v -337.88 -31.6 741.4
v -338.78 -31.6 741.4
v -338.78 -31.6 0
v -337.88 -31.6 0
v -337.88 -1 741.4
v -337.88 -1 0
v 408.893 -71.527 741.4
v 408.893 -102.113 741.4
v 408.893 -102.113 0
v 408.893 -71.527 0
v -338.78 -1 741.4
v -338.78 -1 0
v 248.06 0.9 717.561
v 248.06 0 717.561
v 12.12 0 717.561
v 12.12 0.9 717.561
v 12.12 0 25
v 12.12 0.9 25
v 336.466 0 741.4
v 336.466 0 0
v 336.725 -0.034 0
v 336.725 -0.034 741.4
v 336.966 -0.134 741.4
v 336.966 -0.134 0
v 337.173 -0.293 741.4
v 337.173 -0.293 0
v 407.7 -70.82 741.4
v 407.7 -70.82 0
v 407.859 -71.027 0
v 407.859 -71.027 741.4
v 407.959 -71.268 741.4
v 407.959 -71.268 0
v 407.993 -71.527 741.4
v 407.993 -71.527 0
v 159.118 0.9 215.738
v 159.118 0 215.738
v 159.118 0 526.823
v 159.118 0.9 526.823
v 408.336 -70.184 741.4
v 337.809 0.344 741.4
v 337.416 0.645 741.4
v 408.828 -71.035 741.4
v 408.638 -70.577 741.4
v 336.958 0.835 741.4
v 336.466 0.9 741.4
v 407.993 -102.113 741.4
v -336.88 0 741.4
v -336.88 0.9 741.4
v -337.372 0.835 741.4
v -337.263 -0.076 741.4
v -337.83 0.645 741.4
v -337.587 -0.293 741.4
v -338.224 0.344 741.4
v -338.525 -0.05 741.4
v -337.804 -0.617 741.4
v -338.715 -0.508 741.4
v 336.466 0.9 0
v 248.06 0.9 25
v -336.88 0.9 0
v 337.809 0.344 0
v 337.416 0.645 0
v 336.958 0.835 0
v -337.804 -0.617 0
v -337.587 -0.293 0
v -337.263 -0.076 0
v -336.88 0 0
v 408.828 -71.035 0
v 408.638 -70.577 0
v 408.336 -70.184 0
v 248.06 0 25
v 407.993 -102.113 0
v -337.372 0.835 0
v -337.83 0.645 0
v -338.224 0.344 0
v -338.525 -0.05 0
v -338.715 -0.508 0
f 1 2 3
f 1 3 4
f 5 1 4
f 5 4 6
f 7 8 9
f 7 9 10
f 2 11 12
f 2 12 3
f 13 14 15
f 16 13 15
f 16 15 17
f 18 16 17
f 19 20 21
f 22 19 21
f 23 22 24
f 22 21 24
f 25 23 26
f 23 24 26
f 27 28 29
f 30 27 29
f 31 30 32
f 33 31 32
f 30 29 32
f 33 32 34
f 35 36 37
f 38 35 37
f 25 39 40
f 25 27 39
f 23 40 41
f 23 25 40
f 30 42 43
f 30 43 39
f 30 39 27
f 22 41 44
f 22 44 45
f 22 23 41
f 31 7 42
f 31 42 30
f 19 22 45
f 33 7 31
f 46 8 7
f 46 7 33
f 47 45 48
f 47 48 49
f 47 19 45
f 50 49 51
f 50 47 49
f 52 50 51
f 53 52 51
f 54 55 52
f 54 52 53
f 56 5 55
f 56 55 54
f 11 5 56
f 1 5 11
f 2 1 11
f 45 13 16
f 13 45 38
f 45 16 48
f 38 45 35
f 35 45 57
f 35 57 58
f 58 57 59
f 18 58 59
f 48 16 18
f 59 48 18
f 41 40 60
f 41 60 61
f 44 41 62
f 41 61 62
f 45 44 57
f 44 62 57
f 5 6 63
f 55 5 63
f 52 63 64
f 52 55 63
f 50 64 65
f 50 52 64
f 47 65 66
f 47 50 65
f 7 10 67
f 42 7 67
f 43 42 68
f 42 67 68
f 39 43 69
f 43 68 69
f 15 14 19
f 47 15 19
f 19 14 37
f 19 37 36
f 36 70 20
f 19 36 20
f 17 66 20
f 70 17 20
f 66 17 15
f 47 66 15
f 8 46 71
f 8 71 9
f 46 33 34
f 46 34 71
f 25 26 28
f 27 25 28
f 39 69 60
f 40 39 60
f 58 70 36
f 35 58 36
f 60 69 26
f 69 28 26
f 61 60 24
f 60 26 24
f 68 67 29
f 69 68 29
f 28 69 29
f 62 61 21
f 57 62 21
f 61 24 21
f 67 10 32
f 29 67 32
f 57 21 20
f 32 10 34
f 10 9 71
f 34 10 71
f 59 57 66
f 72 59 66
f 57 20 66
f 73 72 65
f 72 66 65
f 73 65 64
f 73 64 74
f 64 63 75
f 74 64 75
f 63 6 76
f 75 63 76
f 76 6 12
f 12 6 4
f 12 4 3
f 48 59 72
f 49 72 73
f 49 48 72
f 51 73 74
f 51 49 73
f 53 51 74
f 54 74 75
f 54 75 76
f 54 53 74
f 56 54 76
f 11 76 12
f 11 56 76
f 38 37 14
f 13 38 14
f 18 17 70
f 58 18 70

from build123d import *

# Parameters (mm, degrees)
BASE_FLANGE1_DEPTH = 741.4
EDGE_FLANGE1_DEPTH = 741.4
CUT_EXTRUDE3_DEPTH = 1


# Sheet-metal steps are written as plain solids
with BuildPart() as part:
    # Sketch1 → Base-Flange1 (new body)
    with BuildSketch(Plane.XY):
        with BuildLine():
            Line((-336.88, 0), (336.465786438, 0))
            ThreePointArc((336.465786438, 0), (336.84846987, -0.076120467), (337.172893219, -0.292893219))
            Line((337.172893219, -0.292893219), (407.700101013, -70.820101013))
            ThreePointArc((407.700101013, -70.820101013), (407.916873764, -71.144524361), (407.992994231, -71.527207794))
            Line((407.992994231, -71.527207794), (407.992994231, -102.112994231))
            Line((407.992994231, -102.112994231), (408.892994231, -102.112994231))
            Line((408.892994231, -102.112994231), (408.892994231, -71.527207794))
            ThreePointArc((408.892994231, -71.527207794), (408.748365343, -70.800109272), (408.336497116, -70.183704909))
            Line((408.336497116, -70.18370491), (337.809289322, 0.343502884))
            ThreePointArc((337.809289322, 0.343502884), (337.192884959, 0.755371112), (336.465786438, 0.9))
            Line((336.465786438, 0.9), (-336.88, 0.9))
            Line((-336.88, 0.9), (-336.88, 0))
        make_face()
    extrude(amount=BASE_FLANGE1_DEPTH)

    # Edge-Flange1 section (across the edge) → Edge-Flange1 (add)
    with BuildSketch(Plane(origin=(-337.88, 0, 741.4), x_dir=(1, 0, 0), z_dir=(0, 0, -1))):
        with BuildLine():
            Line((-0.9, 1), (-0.9, 31.6))
            Line((-0.9, 31.6), (0, 31.6))
            Line((0, 31.6), (0, 1))
            ThreePointArc((0, 1), (0.292893219, 0.292893219), (1, 0))
            Line((1, 0), (1, -0.9))
            ThreePointArc((1, -0.9), (-0.343502884, -0.343502884), (-0.9, 1))
        make_face()
    extrude(amount=EDGE_FLANGE1_DEPTH)

    # Sketch14 → Cut-Extrude3 (cut)
    with BuildSketch(Plane.XZ):
        Polygon((159.117677791, 526.822723002), (248.060263169, 717.560712871), (12.12, 717.560712871), (12.12, 25), (248.060263169, 25), (159.117677791, 215.737989869), align=None)
    extrude(amount=-CUT_EXTRUDE3_DEPTH, mode=Mode.SUBTRACT)


solid = part.part
